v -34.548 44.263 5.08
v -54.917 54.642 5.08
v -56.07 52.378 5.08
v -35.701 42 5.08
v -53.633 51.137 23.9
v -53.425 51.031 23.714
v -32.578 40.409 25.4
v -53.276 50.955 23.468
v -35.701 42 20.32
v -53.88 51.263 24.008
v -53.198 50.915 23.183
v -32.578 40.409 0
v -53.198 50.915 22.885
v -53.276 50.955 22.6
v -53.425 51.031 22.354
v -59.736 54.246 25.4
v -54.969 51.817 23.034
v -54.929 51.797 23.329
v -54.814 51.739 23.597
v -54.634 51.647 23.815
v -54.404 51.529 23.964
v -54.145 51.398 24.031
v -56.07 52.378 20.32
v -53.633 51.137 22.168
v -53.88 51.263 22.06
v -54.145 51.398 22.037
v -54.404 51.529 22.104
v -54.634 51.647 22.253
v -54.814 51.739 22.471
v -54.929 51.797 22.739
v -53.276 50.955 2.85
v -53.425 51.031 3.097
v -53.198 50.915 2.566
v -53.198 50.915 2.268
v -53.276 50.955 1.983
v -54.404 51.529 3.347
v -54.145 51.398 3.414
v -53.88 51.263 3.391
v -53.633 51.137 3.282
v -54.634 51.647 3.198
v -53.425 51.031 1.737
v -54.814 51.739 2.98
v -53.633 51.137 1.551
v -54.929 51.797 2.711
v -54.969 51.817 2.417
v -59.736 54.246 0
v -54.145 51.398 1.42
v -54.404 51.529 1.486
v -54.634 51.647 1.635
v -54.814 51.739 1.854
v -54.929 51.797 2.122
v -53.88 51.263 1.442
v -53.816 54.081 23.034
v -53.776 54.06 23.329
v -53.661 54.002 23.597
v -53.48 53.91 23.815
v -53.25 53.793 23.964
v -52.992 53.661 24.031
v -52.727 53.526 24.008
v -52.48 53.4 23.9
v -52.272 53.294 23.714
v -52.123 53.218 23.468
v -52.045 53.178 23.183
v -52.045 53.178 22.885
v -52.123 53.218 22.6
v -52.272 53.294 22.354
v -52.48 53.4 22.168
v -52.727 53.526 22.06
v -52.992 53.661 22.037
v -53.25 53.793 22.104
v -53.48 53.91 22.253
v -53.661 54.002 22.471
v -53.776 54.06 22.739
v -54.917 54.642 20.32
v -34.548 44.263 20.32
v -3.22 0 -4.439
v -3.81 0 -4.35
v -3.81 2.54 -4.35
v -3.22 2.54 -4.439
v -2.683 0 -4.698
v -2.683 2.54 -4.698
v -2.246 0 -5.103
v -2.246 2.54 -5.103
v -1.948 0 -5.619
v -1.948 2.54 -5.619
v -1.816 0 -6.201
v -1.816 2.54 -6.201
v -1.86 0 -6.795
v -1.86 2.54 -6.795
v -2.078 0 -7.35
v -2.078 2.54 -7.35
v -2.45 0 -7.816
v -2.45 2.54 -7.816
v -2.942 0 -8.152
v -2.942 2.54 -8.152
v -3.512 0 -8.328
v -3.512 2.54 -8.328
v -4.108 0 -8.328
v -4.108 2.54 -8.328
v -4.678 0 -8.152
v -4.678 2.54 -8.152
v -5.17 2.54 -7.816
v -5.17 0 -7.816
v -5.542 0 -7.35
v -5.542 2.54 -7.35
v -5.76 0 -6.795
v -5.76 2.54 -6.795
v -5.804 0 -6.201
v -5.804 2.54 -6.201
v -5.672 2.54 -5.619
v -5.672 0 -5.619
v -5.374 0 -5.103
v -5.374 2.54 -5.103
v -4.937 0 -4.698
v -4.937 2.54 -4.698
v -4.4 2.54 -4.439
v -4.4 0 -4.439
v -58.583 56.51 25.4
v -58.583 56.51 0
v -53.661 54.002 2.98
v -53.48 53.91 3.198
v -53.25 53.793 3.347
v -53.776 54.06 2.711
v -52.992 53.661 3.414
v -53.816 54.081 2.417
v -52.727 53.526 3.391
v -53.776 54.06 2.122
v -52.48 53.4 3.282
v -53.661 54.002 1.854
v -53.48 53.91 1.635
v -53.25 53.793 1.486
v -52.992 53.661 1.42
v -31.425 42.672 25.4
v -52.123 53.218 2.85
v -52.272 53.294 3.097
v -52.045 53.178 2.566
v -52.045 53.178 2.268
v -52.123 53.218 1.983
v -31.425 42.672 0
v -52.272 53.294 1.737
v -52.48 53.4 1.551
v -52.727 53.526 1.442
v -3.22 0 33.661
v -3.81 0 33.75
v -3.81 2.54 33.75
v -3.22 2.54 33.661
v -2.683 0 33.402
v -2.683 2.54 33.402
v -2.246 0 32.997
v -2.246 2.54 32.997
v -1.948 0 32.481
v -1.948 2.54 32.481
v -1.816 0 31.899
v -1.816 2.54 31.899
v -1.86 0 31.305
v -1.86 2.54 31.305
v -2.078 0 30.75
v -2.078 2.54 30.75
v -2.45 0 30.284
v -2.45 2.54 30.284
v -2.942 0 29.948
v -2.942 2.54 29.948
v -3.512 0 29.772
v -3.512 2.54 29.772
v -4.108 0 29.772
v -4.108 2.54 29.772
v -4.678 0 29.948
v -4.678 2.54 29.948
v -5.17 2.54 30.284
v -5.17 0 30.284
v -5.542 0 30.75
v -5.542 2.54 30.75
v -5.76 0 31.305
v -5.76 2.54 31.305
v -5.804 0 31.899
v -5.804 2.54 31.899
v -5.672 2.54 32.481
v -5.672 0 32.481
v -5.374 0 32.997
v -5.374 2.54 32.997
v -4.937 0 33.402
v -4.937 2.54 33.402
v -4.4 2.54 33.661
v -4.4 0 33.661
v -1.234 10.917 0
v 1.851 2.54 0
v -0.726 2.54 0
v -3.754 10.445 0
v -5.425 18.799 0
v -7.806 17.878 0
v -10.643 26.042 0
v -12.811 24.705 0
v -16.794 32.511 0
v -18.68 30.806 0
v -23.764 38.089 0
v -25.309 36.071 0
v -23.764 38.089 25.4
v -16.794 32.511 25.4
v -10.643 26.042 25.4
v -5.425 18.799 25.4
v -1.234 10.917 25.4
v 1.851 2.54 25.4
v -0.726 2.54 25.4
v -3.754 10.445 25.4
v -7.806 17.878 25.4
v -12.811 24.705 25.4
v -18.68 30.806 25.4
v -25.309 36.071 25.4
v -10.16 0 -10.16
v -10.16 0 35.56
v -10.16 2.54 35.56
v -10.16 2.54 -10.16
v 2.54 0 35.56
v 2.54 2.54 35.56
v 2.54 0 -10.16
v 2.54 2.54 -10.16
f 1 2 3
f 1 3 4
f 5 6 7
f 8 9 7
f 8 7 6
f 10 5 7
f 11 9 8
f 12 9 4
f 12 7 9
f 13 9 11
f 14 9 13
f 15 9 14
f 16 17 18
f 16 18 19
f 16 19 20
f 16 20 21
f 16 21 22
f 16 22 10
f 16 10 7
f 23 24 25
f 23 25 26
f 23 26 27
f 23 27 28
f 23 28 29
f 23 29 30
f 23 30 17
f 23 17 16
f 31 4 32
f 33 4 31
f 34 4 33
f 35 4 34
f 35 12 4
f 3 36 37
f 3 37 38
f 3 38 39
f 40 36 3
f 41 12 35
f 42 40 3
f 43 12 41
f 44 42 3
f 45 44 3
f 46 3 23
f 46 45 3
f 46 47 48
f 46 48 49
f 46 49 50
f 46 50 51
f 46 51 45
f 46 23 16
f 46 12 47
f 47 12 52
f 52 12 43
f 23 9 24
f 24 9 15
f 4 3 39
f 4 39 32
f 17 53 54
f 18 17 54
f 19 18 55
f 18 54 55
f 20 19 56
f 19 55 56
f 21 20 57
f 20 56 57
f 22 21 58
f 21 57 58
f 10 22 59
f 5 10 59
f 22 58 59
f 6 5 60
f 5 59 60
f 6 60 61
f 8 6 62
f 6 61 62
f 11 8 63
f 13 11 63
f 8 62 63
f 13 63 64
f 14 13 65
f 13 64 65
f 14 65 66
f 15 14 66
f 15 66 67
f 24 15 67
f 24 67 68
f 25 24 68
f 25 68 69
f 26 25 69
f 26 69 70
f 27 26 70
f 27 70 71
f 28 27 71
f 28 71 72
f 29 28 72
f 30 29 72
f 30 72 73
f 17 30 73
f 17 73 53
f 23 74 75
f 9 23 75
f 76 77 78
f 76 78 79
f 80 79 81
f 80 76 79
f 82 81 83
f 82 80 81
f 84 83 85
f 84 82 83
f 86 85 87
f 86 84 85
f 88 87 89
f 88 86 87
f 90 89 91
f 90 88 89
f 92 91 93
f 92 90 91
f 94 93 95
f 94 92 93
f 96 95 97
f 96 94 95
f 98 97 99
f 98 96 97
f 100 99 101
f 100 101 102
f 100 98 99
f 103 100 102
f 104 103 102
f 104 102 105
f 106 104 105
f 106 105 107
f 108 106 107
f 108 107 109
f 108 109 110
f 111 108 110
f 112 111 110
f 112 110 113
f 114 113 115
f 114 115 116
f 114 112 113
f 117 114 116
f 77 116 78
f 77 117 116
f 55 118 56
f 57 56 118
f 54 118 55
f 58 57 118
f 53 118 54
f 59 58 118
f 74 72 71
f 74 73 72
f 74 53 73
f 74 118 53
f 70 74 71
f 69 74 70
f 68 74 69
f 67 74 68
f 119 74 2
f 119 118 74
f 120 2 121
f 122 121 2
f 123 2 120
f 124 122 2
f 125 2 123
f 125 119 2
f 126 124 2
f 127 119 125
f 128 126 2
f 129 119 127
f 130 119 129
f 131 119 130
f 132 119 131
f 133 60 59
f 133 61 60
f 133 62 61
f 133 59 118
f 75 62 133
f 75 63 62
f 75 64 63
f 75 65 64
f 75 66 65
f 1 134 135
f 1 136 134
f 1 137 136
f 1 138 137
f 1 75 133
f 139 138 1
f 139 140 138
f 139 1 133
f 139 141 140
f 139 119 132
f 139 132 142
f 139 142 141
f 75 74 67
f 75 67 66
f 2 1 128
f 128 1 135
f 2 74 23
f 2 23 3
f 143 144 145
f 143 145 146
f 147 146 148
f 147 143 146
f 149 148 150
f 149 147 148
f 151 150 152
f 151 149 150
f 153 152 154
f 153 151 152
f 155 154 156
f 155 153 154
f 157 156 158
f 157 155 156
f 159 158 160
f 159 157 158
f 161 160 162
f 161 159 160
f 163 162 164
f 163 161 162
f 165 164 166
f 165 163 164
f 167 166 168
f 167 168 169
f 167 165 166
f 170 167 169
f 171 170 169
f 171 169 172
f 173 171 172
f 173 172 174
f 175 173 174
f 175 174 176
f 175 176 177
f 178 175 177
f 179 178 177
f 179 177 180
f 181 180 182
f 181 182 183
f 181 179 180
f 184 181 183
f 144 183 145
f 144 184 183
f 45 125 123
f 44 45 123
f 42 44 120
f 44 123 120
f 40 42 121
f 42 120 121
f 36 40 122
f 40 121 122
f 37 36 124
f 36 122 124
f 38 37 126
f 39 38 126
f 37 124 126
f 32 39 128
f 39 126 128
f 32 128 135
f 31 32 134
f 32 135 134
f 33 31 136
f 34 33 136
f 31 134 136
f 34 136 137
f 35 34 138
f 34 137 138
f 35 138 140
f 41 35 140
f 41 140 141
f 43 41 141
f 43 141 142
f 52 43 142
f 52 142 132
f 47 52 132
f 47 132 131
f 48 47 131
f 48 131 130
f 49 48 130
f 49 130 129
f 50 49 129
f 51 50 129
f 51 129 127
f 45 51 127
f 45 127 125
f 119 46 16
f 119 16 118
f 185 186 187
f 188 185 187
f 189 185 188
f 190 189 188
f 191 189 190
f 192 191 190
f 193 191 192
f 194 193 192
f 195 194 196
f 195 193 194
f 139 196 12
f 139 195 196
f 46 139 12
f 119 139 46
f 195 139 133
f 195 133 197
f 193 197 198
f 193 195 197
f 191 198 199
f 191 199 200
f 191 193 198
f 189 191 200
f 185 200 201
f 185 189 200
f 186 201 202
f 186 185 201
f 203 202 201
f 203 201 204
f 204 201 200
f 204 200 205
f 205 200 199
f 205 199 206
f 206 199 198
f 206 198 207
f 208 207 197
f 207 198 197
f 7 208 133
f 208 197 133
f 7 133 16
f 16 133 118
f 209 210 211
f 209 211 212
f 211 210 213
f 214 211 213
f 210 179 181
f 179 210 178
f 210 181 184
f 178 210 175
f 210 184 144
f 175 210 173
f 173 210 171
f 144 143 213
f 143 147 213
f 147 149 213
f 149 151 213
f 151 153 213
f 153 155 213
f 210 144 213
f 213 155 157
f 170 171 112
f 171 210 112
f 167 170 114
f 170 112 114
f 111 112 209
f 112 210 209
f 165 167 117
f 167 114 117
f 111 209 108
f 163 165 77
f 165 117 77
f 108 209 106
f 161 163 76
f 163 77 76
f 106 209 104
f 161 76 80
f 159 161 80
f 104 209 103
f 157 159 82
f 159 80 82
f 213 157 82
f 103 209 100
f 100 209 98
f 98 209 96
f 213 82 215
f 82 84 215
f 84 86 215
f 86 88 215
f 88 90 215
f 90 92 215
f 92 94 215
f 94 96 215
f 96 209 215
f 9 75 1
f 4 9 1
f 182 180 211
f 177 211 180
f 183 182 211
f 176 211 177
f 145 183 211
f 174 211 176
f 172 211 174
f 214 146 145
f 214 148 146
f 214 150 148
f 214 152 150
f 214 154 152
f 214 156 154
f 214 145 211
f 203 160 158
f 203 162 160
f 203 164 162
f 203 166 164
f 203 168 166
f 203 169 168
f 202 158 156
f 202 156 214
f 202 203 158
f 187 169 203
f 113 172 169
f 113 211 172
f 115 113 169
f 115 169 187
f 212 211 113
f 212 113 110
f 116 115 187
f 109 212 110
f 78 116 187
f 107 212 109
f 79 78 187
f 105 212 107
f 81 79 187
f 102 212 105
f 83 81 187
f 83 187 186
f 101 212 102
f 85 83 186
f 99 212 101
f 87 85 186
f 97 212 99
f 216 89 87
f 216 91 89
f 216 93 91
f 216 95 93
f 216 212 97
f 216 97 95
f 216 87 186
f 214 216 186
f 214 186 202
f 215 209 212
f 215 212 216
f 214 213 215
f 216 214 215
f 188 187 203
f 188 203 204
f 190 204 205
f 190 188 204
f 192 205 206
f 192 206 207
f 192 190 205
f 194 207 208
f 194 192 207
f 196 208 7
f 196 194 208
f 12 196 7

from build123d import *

# Parameters (mm, degrees)
BOSS_EXTRUDE1_DEPTH = 25.4
CUT_EXTRUDE1_REACH  = 84.87
SKETCH2_R           = 0.99949
SKETCH2_W           = 22.86
SKETCH2_H           = 15.24
SKETCH3_W           = 12.7
SKETCH3_H           = 45.72
SKETCH3_R           = 2
BOSS_EXTRUDE2_DEPTH = 2.54


with BuildPart() as part:
    # Sketch1 → Boss-Extrude1 (new body)
    with BuildSketch(Plane.XY):
        with BuildLine():
            Line((-32.578270726, 40.408843429), (-59.736149583, 54.246473861))
            Line((-59.736149583, 54.246473861), (-58.583013714, 56.509630432))
            Line((-58.583013714, 56.509630432), (-31.425134857, 42.672))
            ThreePointArc((-31.425134857, 42.672), (-9.813641153, 25.020432537), (2.54, 0))
            Line((2.54, 0), (0, 0))
            ThreePointArc((0, 0), (-11.97175713, 23.685162685), (-32.578270726, 40.408843429))
        make_face()
    extrude(amount=BOSS_EXTRUDE1_DEPTH)

    # Sketch2 → Cut-Extrude1 (cut, up to next)
    with BuildSketch(Plane(origin=(10.784234574, 21.165252068, 0), x_dir=(0.8910065241883675, -0.45399049973954775, 0), z_dir=(0.45399049973954775, 0.8910065241883675, 0)), mode=Mode.PRIVATE) as cut_extrude1_sk1:
        with Locations(Location((-71.502682786, -2.41681, 0), (0, 0, 180))):
            Circle(SKETCH2_R)
    cut_extrude1_tool1 = extrude(cut_extrude1_sk1.sketch, amount=-CUT_EXTRUDE1_REACH, mode=Mode.PRIVATE) & part.part
    # Sketch2 → Cut-Extrude1 (cut, up to next)
    with BuildSketch(Plane(origin=(10.784234574, 21.165252068, 0), x_dir=(0.8910065241883675, -0.45399049973954775, 0), z_dir=(0.45399049973954775, 0.8910065241883675, 0)), mode=Mode.PRIVATE) as cut_extrude1_sk2:
        with Locations(Location((-71.502682786, -23.03399, 0), (0, 0, 180))):
            Circle(SKETCH2_R)
    cut_extrude1_tool2 = extrude(cut_extrude1_sk2.sketch, amount=-CUT_EXTRUDE1_REACH, mode=Mode.PRIVATE) & part.part
    # Sketch2 → Cut-Extrude1 (cut, up to next)
    with BuildSketch(Plane(origin=(10.784234574, 21.165252068, 0), x_dir=(0.8910065241883675, -0.45399049973954775, 0), z_dir=(0.45399049973954775, 0.8910065241883675, 0)), mode=Mode.PRIVATE) as cut_extrude1_sk3:
        with Locations((-62.307882786, -12.7)):
            Rectangle(SKETCH2_W, SKETCH2_H)
    cut_extrude1_tool3 = extrude(cut_extrude1_sk3.sketch, amount=-CUT_EXTRUDE1_REACH, mode=Mode.PRIVATE) & part.part
    add(cut_extrude1_tool1.solids().sort_by_distance((-52.925122, 53.626791, 2.41681))[0], mode=Mode.SUBTRACT)
    add(cut_extrude1_tool2.solids().sort_by_distance((-52.925122, 53.626791, 23.03399))[0], mode=Mode.SUBTRACT)
    add(cut_extrude1_tool3.solids().sort_by_distance((-44.732495, 49.452439, 12.7))[0], mode=Mode.SUBTRACT)

    # Sketch3 → Boss-Extrude2 (add)
    with BuildSketch(Plane(origin=(0, 0, 0), x_dir=(1, 0, 0), z_dir=(0, 1, 0))):
        with Locations((-3.81, -12.7)):
            Rectangle(SKETCH3_W, SKETCH3_H)
        with Locations(Location((-3.81, 6.35, 0), (0, 0, 270))):
            Circle(SKETCH3_R, mode=Mode.SUBTRACT)
        with Locations(Location((-3.81, -31.75, 0), (0, 0, 270))):
            Circle(SKETCH3_R, mode=Mode.SUBTRACT)
    extrude(amount=BOSS_EXTRUDE2_DEPTH)


solid = part.part
